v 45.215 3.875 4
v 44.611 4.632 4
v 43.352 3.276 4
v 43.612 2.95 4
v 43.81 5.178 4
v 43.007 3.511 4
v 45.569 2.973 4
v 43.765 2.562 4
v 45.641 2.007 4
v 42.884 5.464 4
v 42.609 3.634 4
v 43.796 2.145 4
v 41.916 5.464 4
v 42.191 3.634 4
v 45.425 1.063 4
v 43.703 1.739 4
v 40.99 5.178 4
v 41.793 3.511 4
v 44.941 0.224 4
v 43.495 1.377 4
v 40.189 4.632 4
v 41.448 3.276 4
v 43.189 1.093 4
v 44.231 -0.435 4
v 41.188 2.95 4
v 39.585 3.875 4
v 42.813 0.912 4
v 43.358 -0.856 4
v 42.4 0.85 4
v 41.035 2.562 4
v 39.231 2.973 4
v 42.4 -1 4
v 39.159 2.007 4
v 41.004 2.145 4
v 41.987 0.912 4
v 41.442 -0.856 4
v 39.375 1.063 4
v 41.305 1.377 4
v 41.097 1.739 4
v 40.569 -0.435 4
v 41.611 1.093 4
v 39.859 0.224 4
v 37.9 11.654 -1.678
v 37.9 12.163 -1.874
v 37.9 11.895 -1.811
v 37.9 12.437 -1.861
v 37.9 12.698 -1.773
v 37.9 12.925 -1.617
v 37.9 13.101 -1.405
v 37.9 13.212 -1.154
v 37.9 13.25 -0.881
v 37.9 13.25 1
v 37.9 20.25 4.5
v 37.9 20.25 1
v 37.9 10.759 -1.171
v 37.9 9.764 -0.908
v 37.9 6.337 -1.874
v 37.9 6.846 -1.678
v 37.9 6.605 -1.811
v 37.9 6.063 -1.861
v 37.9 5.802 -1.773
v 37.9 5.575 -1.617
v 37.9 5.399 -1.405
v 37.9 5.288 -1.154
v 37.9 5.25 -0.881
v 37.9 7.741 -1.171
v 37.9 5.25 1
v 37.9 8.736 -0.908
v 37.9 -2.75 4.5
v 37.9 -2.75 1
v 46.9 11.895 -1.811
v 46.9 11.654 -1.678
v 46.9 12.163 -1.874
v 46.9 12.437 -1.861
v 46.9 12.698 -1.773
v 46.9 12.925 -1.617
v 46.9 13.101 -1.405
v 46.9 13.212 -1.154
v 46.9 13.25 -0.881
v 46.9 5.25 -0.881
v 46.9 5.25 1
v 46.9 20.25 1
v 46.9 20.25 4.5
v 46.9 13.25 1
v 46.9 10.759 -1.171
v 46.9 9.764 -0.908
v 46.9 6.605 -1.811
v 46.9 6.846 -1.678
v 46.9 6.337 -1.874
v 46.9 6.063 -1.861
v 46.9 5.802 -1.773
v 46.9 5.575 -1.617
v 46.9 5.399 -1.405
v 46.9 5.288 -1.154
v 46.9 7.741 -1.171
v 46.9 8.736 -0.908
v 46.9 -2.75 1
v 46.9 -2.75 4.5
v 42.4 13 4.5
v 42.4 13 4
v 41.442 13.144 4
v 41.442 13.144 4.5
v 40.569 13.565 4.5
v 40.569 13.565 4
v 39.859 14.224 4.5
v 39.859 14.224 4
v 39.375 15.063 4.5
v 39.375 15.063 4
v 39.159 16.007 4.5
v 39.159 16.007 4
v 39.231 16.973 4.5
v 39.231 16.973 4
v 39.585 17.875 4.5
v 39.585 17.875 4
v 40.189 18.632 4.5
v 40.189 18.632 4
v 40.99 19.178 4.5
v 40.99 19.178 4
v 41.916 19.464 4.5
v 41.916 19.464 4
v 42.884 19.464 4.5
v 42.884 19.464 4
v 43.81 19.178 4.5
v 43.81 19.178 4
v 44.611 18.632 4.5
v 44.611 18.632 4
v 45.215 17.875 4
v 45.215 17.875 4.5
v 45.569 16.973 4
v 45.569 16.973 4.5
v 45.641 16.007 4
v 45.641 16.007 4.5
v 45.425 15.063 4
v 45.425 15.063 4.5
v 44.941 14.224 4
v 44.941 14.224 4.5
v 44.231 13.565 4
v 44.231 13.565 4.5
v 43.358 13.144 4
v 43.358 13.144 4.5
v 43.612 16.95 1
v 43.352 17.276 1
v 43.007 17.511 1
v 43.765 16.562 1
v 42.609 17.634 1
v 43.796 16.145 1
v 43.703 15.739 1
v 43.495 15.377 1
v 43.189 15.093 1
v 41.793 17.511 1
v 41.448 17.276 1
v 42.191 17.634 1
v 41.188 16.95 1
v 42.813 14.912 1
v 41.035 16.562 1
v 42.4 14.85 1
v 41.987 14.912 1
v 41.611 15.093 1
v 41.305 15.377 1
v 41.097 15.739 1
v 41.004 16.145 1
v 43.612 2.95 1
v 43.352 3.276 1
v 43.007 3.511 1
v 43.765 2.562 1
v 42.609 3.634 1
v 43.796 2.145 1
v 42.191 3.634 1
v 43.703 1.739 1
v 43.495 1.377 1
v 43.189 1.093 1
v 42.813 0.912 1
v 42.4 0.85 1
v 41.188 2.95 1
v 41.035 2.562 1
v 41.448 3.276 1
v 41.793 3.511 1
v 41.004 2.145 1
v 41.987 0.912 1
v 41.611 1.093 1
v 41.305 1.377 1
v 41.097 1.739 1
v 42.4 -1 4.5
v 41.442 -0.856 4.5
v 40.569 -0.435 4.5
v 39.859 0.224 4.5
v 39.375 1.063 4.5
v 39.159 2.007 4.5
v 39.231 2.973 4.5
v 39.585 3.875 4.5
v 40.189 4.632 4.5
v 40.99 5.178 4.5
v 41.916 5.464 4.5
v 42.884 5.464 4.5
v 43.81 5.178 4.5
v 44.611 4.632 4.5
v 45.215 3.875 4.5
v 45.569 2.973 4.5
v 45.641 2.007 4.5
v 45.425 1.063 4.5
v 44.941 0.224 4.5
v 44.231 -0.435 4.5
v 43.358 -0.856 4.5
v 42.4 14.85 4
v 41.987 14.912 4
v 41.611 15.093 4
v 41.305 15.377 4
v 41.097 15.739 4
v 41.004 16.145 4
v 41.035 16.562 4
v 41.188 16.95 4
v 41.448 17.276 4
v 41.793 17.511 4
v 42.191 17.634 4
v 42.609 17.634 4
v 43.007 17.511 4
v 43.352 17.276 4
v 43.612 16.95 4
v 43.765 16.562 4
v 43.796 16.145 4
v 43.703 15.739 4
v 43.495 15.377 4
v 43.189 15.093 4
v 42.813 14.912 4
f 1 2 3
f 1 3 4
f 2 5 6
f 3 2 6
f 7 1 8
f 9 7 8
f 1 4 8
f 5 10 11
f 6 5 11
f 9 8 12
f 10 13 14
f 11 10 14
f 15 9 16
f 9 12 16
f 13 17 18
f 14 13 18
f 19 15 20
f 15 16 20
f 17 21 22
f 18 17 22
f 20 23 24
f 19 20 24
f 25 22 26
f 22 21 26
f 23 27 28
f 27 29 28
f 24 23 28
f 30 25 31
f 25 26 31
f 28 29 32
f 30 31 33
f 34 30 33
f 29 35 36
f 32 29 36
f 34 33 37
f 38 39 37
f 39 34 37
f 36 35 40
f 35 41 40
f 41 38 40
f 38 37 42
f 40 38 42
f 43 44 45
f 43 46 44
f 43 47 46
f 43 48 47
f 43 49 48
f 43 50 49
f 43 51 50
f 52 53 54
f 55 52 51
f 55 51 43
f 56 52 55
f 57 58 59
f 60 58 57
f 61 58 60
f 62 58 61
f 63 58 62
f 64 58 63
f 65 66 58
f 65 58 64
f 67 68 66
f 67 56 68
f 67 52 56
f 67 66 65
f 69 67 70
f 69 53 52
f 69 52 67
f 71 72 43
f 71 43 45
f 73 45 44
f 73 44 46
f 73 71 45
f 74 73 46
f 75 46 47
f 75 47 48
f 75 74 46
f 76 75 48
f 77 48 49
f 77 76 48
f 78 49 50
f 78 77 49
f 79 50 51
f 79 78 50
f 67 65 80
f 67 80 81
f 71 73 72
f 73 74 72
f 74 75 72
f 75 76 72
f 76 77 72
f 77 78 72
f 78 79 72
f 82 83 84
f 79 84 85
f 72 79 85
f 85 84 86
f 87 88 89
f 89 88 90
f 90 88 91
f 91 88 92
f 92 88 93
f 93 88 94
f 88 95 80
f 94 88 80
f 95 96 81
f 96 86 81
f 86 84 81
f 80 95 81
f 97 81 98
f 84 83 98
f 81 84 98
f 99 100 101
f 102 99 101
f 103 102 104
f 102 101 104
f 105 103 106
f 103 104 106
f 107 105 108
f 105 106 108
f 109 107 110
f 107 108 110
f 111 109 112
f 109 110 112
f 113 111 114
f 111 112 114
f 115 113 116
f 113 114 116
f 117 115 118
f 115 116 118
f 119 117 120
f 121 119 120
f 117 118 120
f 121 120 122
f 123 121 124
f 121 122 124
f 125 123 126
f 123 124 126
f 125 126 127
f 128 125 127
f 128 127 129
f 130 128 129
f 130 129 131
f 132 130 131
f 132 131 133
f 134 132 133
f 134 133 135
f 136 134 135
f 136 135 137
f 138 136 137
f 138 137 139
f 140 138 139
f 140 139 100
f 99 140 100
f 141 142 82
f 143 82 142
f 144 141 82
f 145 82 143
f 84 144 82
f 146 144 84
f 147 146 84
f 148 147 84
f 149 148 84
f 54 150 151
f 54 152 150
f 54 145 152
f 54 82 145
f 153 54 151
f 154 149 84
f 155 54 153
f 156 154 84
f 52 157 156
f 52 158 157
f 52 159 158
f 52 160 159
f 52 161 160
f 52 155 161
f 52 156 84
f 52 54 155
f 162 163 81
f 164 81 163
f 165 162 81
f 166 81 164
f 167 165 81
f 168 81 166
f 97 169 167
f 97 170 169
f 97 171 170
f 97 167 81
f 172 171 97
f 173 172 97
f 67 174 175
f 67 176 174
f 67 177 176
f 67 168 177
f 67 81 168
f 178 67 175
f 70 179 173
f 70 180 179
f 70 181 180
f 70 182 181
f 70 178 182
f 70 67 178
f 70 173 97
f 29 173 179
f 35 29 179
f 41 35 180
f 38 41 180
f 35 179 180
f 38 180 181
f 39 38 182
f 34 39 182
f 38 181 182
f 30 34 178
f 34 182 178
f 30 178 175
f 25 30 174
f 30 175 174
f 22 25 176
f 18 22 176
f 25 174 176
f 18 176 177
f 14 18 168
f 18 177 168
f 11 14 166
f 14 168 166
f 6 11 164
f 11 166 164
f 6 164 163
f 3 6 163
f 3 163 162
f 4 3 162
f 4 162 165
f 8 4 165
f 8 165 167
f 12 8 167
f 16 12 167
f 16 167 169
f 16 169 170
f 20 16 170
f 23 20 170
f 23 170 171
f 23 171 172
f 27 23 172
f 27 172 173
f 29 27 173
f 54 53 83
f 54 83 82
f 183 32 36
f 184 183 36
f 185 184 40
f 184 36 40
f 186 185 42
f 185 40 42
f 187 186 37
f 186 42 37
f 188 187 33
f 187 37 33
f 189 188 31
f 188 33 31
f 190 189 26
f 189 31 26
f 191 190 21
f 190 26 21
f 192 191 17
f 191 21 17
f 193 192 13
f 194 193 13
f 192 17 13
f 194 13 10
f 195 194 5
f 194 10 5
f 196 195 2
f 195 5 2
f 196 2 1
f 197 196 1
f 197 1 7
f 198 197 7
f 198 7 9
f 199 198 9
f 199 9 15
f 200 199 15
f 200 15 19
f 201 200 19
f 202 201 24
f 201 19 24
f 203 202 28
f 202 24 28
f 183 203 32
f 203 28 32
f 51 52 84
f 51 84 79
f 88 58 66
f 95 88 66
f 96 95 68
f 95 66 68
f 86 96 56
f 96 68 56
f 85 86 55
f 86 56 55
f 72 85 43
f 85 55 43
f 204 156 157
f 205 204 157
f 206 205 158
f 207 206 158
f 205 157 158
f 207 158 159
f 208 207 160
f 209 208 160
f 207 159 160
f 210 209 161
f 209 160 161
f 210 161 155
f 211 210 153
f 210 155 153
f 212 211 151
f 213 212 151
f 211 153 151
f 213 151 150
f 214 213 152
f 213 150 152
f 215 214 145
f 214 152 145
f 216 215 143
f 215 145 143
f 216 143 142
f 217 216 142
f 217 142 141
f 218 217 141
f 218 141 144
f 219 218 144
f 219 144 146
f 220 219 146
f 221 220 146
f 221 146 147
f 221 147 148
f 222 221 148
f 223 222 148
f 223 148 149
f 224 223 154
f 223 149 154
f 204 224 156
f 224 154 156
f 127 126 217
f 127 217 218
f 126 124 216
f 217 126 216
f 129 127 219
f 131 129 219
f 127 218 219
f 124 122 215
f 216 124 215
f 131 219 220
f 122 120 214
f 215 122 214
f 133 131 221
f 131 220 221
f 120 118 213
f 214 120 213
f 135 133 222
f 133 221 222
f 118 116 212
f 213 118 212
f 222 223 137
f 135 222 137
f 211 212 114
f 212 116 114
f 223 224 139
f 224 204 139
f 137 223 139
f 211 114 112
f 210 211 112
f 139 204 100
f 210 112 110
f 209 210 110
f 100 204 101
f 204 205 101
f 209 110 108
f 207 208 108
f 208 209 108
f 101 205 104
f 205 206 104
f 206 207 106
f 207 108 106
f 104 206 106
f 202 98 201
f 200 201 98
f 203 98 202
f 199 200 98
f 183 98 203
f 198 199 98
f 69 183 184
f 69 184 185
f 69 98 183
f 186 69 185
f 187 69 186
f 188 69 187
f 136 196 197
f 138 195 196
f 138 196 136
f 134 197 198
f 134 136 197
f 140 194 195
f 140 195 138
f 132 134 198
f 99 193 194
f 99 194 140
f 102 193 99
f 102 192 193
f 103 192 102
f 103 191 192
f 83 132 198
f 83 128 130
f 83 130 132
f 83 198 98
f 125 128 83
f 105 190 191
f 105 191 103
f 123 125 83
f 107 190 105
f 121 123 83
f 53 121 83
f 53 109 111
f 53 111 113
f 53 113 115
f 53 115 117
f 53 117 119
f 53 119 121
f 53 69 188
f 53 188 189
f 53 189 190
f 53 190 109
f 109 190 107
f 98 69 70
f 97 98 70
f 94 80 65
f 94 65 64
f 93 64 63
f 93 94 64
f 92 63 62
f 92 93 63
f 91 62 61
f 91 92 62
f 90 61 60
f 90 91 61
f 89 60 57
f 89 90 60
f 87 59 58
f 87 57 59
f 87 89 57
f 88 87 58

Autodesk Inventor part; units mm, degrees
ref_plane "YZ Plane" through (0, 0, 0) normal (1, 0, 0) x (0, 1, 0)
ref_plane "XZ Plane" through (0, 0, 0) normal (0, 1, 0) x (-1, 0, 0)
ref_plane "XY Plane" through (0, 0, 0) normal (0, 0, 1) x (1, 0, 0)
ref_plane "Arbeitsebene1" through (0, 0, 0) normal (0, 0, 1) x (1, 0, 0)
ref_plane "Arbeitsebene2" through (37.9, 18.5, 0) normal (-1, 0, 0) x (0, -1, 0)
sketch "Skizze1" plane through (37.9, 18.5, 0) normal (-1, 0, 0) x (0, -1, 0)
  line L0 (5.15, -4.875) -> (5.15, 0) projected
  line L1 (13.35, 0) -> (59.85, 0) projected
  line L2 (13.35, 0) -> (13.35, -4.875) projected
  arc A0 (5.15, -4.875) -> (13.35, -4.875) centre (9.25, -4.875) ccw projected
  circle A1 centre (9.25, -4.875) radius 4
  line L3 (5.25, -4.875) -> (13.25, -4.875)
  line L4 (13.25, -4.875) -> (13.25, 1)
  line L5 (13.25, 1) -> (5.25, 1)
  line L6 (5.25, 1) -> (5.25, -4.875)
  line L7 (20.25, 4.5) -> (-1.75, 4.5)
  line L8 (-1.75, 4.5) -> (-1.75, 1)
  line L9 (-1.75, 1) -> (20.25, 1)
  line L10 (20.25, 1) -> (20.25, 4.5)
  line L11 (20.25, 4.5) -> (-1.75, 1) construction
  line L12 (-1.75, 4.5) -> (20.25, 1) construction
  line L13 (20.25, 4.5) -> (21.25, 4.5)
  line L14 (21.25, 4.5) -> (21.25, 1)
  line L15 (21.25, 1) -> (20.25, 1)
  line L16 (20.25, 1) -> (20.25, 4.5)
  line L17 (59.85, -17) -> (-8, -17) projected
  line L18 (59.85, 0) -> (59.85, -17) projected
  line L19 (-8, 0) -> (5.15, 0) projected
  line L20 (-8, -17) -> (-8, 0) projected
  point P0 (18.5, 0)
  point P1 (0, 0)
  point P2 (59.85, -12)
  point P3 (9.25, 2.75)
  point P4 (13.25, -4.875)
  point P5 (13.25, 1)
  dimension "d0" = 8
  dimension "d1" = 1
  dimension "d2" = 3.5
  dimension "d3" = 11
  dimension "d14" = 1
extrude "Extrusion1" add sketch "Skizze1" against normal blind 9 contours A1 L6 L5 L4 | L5 L9 L8 L7 L10 | L10 L13 L14 L15
sketch "Skizze2" plane through (37.9, -1.75, 4.5) normal (0, 0, 1) x (1, 0, 0)
  circle A0 centre (4.5, 18) radius 1.4 projected
  circle A1 centre (4.5, 4) radius 1.4 projected
  point P0 (-37.9, 1.75)
hole "Bohrung1" at (42.4, 16.25, 4.5) at (42.4, 2.25, 4.5) direction (0, 0, -1) diameter 2.8 depth 8 tip angle 118 counterbore diameter 6.5 counterbore depth 0.5
fillet "Rundung1" radius 1 2 edges at (42.4, 13.25, -4.875) (42.4, 5.25, -4.875)
properties part number "Holisheet_tubeclamp"
